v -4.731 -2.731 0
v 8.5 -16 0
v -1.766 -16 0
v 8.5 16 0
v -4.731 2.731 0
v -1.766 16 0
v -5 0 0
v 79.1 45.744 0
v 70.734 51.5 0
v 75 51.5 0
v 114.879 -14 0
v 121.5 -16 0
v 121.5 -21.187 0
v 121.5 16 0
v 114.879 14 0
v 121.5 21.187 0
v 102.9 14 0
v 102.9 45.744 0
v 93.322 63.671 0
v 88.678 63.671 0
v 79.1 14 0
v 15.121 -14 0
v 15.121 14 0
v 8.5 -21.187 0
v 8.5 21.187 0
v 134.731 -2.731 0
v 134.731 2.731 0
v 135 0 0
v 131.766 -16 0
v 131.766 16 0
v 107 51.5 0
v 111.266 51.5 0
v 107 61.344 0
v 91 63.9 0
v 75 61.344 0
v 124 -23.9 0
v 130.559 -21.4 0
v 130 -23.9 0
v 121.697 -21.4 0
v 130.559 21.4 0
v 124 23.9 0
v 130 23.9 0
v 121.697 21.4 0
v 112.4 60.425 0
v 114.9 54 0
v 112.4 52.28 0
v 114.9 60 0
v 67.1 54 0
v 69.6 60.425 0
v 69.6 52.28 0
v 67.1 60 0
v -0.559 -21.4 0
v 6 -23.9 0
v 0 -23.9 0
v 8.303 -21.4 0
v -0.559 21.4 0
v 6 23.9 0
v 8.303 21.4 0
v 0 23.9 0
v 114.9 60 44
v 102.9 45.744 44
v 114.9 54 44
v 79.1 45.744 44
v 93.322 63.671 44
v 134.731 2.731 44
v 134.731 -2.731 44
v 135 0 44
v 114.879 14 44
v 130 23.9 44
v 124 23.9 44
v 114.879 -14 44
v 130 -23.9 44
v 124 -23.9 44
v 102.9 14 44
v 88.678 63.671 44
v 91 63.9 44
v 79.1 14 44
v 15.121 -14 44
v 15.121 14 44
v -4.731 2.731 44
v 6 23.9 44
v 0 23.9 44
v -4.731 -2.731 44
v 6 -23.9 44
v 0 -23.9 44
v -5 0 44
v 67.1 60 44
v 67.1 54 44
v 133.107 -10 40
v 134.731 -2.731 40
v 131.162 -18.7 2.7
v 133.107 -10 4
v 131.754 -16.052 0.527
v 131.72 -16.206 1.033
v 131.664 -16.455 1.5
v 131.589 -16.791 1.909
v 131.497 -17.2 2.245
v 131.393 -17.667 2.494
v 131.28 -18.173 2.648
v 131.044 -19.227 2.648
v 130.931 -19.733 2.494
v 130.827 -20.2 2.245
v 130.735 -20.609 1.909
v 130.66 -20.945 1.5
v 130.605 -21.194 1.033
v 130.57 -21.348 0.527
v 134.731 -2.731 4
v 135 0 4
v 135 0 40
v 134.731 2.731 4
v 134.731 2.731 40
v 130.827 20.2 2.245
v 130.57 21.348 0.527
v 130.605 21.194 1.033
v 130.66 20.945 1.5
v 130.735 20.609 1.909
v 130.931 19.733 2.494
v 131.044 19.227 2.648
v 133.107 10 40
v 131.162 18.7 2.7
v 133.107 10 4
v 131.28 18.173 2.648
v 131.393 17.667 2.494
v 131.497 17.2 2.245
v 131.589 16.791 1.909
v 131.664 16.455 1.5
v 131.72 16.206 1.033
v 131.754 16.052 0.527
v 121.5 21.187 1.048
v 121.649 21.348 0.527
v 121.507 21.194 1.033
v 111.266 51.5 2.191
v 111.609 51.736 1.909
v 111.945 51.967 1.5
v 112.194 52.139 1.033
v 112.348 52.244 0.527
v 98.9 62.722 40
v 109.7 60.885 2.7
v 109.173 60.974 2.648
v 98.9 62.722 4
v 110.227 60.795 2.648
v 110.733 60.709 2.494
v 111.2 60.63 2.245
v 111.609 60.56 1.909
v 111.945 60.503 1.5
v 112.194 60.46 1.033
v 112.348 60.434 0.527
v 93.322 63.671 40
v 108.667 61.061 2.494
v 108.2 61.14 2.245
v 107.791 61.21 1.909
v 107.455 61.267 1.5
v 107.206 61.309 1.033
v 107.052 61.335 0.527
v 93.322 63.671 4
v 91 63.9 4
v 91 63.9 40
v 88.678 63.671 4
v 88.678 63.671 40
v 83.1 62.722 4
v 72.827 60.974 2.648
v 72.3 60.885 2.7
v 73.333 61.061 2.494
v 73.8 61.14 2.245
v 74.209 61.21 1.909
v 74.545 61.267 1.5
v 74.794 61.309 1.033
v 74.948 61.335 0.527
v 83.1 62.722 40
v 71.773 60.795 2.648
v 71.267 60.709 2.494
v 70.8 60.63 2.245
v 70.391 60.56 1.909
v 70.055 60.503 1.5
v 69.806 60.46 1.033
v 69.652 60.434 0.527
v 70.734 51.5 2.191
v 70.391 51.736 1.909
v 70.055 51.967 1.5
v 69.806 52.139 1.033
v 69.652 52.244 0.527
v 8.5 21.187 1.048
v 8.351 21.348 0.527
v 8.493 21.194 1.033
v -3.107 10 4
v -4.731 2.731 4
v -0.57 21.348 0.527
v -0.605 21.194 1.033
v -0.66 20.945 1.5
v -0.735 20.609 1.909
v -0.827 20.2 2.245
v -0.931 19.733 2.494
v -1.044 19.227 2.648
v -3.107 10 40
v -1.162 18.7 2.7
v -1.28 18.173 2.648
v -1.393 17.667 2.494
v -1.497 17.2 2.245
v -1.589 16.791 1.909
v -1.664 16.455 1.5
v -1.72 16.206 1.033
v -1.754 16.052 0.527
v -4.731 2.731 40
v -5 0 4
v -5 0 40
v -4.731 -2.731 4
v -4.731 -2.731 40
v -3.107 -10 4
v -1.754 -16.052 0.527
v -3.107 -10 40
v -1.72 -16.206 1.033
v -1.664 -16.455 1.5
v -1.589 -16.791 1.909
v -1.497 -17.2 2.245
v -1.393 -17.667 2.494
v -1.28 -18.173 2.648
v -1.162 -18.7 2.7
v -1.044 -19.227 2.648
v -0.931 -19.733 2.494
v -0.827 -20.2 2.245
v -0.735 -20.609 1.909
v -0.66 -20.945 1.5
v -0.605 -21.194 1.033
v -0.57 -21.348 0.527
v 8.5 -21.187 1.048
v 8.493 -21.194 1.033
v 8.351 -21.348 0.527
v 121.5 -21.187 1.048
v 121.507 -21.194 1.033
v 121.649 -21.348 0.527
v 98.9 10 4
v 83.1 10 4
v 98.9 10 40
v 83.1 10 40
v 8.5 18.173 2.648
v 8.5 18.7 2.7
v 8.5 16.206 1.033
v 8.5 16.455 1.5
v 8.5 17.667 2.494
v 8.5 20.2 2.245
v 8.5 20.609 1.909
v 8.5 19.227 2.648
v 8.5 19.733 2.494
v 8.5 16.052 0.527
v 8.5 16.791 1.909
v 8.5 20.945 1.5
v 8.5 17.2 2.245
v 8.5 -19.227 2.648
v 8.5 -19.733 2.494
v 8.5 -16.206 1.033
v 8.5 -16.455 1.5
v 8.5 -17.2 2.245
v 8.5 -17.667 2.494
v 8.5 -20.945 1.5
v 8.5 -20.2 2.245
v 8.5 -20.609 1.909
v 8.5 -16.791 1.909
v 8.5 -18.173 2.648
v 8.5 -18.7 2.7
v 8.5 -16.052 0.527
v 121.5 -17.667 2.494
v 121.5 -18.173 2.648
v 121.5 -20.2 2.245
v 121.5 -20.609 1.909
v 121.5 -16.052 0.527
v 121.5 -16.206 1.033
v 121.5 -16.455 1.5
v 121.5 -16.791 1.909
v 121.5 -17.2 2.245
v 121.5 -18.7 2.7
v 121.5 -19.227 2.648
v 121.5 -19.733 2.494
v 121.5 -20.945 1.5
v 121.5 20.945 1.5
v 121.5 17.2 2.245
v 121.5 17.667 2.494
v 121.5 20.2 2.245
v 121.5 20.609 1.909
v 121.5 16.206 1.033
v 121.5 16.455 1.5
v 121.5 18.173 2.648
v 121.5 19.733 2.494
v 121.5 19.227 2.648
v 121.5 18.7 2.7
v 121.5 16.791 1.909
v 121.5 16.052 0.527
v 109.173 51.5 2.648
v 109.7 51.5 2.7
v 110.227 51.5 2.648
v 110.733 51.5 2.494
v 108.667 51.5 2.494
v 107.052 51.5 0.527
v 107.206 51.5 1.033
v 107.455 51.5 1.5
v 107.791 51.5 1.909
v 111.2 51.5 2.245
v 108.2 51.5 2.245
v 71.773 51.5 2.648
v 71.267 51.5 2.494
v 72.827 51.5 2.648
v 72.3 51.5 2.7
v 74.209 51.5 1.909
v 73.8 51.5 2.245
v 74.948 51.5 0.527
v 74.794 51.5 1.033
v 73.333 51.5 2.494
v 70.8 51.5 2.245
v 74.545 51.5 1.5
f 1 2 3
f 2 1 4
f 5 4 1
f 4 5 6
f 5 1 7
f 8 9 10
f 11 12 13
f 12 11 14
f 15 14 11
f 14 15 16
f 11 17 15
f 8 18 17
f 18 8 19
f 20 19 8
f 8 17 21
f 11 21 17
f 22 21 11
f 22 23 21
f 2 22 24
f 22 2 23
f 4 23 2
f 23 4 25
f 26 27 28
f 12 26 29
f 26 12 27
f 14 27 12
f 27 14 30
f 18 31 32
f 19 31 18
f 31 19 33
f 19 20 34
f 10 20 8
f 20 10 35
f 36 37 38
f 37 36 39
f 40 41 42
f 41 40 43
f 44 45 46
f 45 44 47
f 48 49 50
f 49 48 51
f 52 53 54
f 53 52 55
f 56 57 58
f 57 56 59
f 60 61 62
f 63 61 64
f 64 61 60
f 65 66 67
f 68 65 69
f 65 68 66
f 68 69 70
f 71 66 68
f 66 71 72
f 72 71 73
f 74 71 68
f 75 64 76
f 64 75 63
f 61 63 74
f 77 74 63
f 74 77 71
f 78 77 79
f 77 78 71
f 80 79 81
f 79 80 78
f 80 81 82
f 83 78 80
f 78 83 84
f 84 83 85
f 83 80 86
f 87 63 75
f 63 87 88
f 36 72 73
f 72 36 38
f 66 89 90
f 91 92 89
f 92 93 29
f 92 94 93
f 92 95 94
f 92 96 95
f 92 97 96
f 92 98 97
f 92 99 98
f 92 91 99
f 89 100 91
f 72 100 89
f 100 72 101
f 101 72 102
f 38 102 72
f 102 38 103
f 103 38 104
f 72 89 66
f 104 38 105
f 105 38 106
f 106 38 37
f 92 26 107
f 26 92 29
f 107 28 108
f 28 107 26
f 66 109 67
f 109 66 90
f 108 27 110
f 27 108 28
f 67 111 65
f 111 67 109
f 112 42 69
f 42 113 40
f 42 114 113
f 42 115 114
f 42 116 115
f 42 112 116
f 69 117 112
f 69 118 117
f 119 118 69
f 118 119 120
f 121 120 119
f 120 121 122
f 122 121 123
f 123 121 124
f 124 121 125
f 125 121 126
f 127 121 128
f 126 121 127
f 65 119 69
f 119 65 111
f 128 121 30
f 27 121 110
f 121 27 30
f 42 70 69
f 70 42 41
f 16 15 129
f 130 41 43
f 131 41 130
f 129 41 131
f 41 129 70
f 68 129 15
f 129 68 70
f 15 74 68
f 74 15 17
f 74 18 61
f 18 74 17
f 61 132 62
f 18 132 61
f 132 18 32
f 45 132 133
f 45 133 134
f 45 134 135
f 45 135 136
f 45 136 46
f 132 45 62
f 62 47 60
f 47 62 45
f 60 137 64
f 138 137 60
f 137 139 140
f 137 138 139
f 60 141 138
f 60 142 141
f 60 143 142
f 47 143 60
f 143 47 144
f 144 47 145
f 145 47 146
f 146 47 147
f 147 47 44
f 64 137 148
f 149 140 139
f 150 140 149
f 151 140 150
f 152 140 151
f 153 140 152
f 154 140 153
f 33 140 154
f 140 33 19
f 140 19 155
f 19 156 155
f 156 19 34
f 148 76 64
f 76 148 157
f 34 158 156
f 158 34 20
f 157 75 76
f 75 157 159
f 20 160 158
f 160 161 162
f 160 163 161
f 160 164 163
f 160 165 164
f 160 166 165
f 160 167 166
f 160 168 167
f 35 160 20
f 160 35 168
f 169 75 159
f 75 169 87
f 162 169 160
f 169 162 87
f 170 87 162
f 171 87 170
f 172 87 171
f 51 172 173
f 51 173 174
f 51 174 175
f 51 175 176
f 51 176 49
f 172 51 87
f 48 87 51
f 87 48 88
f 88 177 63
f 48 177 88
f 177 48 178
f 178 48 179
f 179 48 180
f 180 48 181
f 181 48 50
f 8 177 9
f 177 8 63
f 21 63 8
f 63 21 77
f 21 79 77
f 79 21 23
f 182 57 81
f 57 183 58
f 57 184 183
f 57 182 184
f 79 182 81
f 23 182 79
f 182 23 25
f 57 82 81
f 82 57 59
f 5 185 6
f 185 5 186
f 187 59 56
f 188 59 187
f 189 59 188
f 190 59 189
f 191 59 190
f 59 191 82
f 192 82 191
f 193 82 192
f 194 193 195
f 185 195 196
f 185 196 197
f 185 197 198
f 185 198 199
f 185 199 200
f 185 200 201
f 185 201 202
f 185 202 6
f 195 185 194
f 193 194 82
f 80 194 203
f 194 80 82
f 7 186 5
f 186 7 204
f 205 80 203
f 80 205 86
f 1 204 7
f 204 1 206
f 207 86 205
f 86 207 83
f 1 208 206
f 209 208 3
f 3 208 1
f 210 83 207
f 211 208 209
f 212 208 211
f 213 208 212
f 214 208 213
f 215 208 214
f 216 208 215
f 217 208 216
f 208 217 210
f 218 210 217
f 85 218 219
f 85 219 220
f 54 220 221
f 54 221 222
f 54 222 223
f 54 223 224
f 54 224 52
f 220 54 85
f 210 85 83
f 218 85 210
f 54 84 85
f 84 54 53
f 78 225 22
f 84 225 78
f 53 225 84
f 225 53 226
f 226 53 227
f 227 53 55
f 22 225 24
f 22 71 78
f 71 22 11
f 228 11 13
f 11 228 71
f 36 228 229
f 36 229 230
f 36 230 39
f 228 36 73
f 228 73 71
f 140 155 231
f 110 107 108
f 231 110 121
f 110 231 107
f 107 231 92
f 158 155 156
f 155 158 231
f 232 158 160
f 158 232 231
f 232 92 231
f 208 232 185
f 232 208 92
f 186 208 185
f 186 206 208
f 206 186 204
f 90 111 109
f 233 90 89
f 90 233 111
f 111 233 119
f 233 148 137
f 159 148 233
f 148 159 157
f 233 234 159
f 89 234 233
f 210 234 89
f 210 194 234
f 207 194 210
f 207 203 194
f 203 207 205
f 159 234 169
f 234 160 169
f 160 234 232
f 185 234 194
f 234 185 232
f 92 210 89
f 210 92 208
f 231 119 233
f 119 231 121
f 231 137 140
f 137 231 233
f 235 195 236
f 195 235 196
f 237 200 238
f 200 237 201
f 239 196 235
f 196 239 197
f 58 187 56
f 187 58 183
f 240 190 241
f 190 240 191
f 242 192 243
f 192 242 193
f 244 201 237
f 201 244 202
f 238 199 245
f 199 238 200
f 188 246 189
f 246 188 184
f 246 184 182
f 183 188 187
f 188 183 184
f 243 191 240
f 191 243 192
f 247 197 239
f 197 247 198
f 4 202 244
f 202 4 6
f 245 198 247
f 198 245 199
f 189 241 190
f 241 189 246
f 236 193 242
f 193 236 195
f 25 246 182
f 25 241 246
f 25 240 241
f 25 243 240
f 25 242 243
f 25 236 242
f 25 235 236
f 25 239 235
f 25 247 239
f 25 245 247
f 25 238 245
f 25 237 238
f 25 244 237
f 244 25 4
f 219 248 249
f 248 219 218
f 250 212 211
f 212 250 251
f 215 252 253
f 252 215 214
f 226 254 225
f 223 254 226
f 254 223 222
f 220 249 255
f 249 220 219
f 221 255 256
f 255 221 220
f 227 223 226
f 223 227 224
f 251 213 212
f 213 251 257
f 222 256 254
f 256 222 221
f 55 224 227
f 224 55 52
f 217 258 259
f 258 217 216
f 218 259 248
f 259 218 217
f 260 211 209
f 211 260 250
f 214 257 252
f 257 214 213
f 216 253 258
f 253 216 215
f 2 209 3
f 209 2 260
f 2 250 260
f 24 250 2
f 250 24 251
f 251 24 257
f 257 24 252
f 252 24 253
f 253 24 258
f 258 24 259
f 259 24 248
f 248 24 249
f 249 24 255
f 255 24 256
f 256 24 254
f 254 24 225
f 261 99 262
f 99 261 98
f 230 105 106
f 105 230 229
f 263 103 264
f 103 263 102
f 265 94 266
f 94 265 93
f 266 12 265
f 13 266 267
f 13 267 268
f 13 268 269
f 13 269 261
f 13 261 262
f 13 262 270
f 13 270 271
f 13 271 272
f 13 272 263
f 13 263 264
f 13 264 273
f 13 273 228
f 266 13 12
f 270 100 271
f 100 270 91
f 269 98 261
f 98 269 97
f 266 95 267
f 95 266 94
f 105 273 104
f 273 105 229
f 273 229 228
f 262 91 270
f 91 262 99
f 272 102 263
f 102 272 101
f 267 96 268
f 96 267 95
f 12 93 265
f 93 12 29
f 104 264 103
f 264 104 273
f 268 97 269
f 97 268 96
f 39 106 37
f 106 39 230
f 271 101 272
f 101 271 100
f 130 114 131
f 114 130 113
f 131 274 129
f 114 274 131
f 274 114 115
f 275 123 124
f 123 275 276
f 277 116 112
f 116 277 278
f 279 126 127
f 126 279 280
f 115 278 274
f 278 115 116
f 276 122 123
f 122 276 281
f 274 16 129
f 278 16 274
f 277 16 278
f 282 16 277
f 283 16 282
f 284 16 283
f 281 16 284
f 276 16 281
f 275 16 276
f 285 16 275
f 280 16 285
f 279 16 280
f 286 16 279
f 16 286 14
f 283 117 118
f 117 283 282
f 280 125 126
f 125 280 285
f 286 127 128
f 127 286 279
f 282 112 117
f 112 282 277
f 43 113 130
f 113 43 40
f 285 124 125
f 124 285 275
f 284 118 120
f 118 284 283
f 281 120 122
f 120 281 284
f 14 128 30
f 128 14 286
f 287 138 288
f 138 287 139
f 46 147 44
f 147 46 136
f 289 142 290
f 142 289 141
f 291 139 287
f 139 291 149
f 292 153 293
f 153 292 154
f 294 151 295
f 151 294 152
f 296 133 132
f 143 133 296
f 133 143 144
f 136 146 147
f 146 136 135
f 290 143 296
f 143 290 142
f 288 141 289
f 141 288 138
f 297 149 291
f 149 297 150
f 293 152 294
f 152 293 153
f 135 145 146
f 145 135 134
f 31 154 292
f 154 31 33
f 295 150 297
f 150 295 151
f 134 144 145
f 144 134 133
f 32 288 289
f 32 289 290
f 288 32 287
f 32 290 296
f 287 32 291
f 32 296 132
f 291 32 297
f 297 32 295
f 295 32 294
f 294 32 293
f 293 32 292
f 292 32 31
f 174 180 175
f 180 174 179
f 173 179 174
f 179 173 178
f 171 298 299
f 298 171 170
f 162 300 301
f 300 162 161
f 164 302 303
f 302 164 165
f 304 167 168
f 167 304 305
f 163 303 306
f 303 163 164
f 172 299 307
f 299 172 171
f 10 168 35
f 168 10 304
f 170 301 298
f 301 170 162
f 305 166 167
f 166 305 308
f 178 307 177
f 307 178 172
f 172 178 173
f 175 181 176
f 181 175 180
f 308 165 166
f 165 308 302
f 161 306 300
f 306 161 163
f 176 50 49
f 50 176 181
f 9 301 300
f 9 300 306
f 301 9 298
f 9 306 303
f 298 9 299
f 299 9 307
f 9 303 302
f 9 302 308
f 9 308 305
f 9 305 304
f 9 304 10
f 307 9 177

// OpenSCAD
$fn = 32;

// ----------------------------------------------------------------------
// Air duct: 28 mm duct, 4 mm wall, 44 mm across
// ----------------------------------------------------------------------

// --- parameters (mm) ---
duct_r = 14;              // duct core radius
duct_d = 28;              // duct core diameter
wall = 4;                 // duct wall thickness
height = 44;              // duct width (extrusion height)
port_r = 23.9;            // port flange half width
port_d = 47.8;            // port flange width
port_t = 6;               // port flange thickness
bolt_d = 5.4;             // port bolt holes
bolt_offset = 18.7;       // bolt hole offset from the port axis
branch_r = 11.9;          // branch core radius
branch_d = 23.8;          // branch core diameter
branch_len = 60;          // branch length from the run axis

difference() {
  /* outer hull chain: tube with a flat flange plate at every port */
  linear_extrude(height = 44) {
    hull() {
      polygon([[0, -23.9], [0, 23.9], [6, 23.9], [6, -23.9]]);
      translate([9, 0]) circle(r = 14);
    }
    hull() {
      translate([9, 0]) circle(r = 14);
      translate([39, 0]) circle(r = 14);
    }
    hull() {
      translate([39, 0]) circle(r = 14);
      translate([91, 0]) circle(r = 14);
    }
    hull() {
      translate([91, 0]) circle(r = 14);
      translate([121, 0]) circle(r = 14);
    }
    hull() {
      translate([121, 0]) circle(r = 14);
      polygon([[130, 23.9], [130, -23.9], [124, -23.9], [124, 23.9]]);
    }
    hull() {
      translate([91, 0]) circle(r = 11.9);
      translate([91, 33]) circle(r = 11.9);
    }
    hull() {
      translate([91, 33]) circle(r = 11.9);
      translate([91, 52]) circle(r = 11.9);
    }
    hull() {
      translate([91, 52]) circle(r = 11.9);
      polygon([[67.1, 60], [114.9, 60], [114.9, 54], [67.1, 54]]);
    }
  }
  /* air passage: the same chain inset by the wall, 5 mm proud of the ports */
  translate([0, 0, 4]) linear_extrude(height = 36) {
    hull() {
      translate([-5, 0]) circle(r = 10);
      translate([39, 0]) circle(r = 10);
    }
    hull() {
      translate([39, 0]) circle(r = 10);
      translate([91, 0]) circle(r = 10);
    }
    hull() {
      translate([91, 0]) circle(r = 10);
      translate([135, 0]) circle(r = 10);
    }
    hull() {
      translate([91, 0]) circle(r = 7.9);
      translate([91, 33]) circle(r = 7.9);
    }
    hull() {
      translate([91, 33]) circle(r = 7.9);
      translate([91, 65]) circle(r = 7.9);
    }
  }
  translate([0, 0]) rotate([0, 0, -90]) translate([-18.7, -2.5]) rotate([-90, 0, 0]) cylinder(h = 11, d = 5.4);
  translate([0, 0]) rotate([0, 0, -90]) translate([18.7, -2.5]) rotate([-90, 0, 0]) cylinder(h = 11, d = 5.4);
  translate([130, 0]) rotate([0, 0, 90]) translate([-18.7, -2.5]) rotate([-90, 0, 0]) cylinder(h = 11, d = 5.4);
  translate([130, 0]) rotate([0, 0, 90]) translate([18.7, -2.5]) rotate([-90, 0, 0]) cylinder(h = 11, d = 5.4);
  translate([91, 60]) rotate([0, 0, 180]) translate([-18.7, -2.5]) rotate([-90, 0, 0]) cylinder(h = 11, d = 5.4);
  translate([91, 60]) rotate([0, 0, 180]) translate([18.7, -2.5]) rotate([-90, 0, 0]) cylinder(h = 11, d = 5.4);
}
